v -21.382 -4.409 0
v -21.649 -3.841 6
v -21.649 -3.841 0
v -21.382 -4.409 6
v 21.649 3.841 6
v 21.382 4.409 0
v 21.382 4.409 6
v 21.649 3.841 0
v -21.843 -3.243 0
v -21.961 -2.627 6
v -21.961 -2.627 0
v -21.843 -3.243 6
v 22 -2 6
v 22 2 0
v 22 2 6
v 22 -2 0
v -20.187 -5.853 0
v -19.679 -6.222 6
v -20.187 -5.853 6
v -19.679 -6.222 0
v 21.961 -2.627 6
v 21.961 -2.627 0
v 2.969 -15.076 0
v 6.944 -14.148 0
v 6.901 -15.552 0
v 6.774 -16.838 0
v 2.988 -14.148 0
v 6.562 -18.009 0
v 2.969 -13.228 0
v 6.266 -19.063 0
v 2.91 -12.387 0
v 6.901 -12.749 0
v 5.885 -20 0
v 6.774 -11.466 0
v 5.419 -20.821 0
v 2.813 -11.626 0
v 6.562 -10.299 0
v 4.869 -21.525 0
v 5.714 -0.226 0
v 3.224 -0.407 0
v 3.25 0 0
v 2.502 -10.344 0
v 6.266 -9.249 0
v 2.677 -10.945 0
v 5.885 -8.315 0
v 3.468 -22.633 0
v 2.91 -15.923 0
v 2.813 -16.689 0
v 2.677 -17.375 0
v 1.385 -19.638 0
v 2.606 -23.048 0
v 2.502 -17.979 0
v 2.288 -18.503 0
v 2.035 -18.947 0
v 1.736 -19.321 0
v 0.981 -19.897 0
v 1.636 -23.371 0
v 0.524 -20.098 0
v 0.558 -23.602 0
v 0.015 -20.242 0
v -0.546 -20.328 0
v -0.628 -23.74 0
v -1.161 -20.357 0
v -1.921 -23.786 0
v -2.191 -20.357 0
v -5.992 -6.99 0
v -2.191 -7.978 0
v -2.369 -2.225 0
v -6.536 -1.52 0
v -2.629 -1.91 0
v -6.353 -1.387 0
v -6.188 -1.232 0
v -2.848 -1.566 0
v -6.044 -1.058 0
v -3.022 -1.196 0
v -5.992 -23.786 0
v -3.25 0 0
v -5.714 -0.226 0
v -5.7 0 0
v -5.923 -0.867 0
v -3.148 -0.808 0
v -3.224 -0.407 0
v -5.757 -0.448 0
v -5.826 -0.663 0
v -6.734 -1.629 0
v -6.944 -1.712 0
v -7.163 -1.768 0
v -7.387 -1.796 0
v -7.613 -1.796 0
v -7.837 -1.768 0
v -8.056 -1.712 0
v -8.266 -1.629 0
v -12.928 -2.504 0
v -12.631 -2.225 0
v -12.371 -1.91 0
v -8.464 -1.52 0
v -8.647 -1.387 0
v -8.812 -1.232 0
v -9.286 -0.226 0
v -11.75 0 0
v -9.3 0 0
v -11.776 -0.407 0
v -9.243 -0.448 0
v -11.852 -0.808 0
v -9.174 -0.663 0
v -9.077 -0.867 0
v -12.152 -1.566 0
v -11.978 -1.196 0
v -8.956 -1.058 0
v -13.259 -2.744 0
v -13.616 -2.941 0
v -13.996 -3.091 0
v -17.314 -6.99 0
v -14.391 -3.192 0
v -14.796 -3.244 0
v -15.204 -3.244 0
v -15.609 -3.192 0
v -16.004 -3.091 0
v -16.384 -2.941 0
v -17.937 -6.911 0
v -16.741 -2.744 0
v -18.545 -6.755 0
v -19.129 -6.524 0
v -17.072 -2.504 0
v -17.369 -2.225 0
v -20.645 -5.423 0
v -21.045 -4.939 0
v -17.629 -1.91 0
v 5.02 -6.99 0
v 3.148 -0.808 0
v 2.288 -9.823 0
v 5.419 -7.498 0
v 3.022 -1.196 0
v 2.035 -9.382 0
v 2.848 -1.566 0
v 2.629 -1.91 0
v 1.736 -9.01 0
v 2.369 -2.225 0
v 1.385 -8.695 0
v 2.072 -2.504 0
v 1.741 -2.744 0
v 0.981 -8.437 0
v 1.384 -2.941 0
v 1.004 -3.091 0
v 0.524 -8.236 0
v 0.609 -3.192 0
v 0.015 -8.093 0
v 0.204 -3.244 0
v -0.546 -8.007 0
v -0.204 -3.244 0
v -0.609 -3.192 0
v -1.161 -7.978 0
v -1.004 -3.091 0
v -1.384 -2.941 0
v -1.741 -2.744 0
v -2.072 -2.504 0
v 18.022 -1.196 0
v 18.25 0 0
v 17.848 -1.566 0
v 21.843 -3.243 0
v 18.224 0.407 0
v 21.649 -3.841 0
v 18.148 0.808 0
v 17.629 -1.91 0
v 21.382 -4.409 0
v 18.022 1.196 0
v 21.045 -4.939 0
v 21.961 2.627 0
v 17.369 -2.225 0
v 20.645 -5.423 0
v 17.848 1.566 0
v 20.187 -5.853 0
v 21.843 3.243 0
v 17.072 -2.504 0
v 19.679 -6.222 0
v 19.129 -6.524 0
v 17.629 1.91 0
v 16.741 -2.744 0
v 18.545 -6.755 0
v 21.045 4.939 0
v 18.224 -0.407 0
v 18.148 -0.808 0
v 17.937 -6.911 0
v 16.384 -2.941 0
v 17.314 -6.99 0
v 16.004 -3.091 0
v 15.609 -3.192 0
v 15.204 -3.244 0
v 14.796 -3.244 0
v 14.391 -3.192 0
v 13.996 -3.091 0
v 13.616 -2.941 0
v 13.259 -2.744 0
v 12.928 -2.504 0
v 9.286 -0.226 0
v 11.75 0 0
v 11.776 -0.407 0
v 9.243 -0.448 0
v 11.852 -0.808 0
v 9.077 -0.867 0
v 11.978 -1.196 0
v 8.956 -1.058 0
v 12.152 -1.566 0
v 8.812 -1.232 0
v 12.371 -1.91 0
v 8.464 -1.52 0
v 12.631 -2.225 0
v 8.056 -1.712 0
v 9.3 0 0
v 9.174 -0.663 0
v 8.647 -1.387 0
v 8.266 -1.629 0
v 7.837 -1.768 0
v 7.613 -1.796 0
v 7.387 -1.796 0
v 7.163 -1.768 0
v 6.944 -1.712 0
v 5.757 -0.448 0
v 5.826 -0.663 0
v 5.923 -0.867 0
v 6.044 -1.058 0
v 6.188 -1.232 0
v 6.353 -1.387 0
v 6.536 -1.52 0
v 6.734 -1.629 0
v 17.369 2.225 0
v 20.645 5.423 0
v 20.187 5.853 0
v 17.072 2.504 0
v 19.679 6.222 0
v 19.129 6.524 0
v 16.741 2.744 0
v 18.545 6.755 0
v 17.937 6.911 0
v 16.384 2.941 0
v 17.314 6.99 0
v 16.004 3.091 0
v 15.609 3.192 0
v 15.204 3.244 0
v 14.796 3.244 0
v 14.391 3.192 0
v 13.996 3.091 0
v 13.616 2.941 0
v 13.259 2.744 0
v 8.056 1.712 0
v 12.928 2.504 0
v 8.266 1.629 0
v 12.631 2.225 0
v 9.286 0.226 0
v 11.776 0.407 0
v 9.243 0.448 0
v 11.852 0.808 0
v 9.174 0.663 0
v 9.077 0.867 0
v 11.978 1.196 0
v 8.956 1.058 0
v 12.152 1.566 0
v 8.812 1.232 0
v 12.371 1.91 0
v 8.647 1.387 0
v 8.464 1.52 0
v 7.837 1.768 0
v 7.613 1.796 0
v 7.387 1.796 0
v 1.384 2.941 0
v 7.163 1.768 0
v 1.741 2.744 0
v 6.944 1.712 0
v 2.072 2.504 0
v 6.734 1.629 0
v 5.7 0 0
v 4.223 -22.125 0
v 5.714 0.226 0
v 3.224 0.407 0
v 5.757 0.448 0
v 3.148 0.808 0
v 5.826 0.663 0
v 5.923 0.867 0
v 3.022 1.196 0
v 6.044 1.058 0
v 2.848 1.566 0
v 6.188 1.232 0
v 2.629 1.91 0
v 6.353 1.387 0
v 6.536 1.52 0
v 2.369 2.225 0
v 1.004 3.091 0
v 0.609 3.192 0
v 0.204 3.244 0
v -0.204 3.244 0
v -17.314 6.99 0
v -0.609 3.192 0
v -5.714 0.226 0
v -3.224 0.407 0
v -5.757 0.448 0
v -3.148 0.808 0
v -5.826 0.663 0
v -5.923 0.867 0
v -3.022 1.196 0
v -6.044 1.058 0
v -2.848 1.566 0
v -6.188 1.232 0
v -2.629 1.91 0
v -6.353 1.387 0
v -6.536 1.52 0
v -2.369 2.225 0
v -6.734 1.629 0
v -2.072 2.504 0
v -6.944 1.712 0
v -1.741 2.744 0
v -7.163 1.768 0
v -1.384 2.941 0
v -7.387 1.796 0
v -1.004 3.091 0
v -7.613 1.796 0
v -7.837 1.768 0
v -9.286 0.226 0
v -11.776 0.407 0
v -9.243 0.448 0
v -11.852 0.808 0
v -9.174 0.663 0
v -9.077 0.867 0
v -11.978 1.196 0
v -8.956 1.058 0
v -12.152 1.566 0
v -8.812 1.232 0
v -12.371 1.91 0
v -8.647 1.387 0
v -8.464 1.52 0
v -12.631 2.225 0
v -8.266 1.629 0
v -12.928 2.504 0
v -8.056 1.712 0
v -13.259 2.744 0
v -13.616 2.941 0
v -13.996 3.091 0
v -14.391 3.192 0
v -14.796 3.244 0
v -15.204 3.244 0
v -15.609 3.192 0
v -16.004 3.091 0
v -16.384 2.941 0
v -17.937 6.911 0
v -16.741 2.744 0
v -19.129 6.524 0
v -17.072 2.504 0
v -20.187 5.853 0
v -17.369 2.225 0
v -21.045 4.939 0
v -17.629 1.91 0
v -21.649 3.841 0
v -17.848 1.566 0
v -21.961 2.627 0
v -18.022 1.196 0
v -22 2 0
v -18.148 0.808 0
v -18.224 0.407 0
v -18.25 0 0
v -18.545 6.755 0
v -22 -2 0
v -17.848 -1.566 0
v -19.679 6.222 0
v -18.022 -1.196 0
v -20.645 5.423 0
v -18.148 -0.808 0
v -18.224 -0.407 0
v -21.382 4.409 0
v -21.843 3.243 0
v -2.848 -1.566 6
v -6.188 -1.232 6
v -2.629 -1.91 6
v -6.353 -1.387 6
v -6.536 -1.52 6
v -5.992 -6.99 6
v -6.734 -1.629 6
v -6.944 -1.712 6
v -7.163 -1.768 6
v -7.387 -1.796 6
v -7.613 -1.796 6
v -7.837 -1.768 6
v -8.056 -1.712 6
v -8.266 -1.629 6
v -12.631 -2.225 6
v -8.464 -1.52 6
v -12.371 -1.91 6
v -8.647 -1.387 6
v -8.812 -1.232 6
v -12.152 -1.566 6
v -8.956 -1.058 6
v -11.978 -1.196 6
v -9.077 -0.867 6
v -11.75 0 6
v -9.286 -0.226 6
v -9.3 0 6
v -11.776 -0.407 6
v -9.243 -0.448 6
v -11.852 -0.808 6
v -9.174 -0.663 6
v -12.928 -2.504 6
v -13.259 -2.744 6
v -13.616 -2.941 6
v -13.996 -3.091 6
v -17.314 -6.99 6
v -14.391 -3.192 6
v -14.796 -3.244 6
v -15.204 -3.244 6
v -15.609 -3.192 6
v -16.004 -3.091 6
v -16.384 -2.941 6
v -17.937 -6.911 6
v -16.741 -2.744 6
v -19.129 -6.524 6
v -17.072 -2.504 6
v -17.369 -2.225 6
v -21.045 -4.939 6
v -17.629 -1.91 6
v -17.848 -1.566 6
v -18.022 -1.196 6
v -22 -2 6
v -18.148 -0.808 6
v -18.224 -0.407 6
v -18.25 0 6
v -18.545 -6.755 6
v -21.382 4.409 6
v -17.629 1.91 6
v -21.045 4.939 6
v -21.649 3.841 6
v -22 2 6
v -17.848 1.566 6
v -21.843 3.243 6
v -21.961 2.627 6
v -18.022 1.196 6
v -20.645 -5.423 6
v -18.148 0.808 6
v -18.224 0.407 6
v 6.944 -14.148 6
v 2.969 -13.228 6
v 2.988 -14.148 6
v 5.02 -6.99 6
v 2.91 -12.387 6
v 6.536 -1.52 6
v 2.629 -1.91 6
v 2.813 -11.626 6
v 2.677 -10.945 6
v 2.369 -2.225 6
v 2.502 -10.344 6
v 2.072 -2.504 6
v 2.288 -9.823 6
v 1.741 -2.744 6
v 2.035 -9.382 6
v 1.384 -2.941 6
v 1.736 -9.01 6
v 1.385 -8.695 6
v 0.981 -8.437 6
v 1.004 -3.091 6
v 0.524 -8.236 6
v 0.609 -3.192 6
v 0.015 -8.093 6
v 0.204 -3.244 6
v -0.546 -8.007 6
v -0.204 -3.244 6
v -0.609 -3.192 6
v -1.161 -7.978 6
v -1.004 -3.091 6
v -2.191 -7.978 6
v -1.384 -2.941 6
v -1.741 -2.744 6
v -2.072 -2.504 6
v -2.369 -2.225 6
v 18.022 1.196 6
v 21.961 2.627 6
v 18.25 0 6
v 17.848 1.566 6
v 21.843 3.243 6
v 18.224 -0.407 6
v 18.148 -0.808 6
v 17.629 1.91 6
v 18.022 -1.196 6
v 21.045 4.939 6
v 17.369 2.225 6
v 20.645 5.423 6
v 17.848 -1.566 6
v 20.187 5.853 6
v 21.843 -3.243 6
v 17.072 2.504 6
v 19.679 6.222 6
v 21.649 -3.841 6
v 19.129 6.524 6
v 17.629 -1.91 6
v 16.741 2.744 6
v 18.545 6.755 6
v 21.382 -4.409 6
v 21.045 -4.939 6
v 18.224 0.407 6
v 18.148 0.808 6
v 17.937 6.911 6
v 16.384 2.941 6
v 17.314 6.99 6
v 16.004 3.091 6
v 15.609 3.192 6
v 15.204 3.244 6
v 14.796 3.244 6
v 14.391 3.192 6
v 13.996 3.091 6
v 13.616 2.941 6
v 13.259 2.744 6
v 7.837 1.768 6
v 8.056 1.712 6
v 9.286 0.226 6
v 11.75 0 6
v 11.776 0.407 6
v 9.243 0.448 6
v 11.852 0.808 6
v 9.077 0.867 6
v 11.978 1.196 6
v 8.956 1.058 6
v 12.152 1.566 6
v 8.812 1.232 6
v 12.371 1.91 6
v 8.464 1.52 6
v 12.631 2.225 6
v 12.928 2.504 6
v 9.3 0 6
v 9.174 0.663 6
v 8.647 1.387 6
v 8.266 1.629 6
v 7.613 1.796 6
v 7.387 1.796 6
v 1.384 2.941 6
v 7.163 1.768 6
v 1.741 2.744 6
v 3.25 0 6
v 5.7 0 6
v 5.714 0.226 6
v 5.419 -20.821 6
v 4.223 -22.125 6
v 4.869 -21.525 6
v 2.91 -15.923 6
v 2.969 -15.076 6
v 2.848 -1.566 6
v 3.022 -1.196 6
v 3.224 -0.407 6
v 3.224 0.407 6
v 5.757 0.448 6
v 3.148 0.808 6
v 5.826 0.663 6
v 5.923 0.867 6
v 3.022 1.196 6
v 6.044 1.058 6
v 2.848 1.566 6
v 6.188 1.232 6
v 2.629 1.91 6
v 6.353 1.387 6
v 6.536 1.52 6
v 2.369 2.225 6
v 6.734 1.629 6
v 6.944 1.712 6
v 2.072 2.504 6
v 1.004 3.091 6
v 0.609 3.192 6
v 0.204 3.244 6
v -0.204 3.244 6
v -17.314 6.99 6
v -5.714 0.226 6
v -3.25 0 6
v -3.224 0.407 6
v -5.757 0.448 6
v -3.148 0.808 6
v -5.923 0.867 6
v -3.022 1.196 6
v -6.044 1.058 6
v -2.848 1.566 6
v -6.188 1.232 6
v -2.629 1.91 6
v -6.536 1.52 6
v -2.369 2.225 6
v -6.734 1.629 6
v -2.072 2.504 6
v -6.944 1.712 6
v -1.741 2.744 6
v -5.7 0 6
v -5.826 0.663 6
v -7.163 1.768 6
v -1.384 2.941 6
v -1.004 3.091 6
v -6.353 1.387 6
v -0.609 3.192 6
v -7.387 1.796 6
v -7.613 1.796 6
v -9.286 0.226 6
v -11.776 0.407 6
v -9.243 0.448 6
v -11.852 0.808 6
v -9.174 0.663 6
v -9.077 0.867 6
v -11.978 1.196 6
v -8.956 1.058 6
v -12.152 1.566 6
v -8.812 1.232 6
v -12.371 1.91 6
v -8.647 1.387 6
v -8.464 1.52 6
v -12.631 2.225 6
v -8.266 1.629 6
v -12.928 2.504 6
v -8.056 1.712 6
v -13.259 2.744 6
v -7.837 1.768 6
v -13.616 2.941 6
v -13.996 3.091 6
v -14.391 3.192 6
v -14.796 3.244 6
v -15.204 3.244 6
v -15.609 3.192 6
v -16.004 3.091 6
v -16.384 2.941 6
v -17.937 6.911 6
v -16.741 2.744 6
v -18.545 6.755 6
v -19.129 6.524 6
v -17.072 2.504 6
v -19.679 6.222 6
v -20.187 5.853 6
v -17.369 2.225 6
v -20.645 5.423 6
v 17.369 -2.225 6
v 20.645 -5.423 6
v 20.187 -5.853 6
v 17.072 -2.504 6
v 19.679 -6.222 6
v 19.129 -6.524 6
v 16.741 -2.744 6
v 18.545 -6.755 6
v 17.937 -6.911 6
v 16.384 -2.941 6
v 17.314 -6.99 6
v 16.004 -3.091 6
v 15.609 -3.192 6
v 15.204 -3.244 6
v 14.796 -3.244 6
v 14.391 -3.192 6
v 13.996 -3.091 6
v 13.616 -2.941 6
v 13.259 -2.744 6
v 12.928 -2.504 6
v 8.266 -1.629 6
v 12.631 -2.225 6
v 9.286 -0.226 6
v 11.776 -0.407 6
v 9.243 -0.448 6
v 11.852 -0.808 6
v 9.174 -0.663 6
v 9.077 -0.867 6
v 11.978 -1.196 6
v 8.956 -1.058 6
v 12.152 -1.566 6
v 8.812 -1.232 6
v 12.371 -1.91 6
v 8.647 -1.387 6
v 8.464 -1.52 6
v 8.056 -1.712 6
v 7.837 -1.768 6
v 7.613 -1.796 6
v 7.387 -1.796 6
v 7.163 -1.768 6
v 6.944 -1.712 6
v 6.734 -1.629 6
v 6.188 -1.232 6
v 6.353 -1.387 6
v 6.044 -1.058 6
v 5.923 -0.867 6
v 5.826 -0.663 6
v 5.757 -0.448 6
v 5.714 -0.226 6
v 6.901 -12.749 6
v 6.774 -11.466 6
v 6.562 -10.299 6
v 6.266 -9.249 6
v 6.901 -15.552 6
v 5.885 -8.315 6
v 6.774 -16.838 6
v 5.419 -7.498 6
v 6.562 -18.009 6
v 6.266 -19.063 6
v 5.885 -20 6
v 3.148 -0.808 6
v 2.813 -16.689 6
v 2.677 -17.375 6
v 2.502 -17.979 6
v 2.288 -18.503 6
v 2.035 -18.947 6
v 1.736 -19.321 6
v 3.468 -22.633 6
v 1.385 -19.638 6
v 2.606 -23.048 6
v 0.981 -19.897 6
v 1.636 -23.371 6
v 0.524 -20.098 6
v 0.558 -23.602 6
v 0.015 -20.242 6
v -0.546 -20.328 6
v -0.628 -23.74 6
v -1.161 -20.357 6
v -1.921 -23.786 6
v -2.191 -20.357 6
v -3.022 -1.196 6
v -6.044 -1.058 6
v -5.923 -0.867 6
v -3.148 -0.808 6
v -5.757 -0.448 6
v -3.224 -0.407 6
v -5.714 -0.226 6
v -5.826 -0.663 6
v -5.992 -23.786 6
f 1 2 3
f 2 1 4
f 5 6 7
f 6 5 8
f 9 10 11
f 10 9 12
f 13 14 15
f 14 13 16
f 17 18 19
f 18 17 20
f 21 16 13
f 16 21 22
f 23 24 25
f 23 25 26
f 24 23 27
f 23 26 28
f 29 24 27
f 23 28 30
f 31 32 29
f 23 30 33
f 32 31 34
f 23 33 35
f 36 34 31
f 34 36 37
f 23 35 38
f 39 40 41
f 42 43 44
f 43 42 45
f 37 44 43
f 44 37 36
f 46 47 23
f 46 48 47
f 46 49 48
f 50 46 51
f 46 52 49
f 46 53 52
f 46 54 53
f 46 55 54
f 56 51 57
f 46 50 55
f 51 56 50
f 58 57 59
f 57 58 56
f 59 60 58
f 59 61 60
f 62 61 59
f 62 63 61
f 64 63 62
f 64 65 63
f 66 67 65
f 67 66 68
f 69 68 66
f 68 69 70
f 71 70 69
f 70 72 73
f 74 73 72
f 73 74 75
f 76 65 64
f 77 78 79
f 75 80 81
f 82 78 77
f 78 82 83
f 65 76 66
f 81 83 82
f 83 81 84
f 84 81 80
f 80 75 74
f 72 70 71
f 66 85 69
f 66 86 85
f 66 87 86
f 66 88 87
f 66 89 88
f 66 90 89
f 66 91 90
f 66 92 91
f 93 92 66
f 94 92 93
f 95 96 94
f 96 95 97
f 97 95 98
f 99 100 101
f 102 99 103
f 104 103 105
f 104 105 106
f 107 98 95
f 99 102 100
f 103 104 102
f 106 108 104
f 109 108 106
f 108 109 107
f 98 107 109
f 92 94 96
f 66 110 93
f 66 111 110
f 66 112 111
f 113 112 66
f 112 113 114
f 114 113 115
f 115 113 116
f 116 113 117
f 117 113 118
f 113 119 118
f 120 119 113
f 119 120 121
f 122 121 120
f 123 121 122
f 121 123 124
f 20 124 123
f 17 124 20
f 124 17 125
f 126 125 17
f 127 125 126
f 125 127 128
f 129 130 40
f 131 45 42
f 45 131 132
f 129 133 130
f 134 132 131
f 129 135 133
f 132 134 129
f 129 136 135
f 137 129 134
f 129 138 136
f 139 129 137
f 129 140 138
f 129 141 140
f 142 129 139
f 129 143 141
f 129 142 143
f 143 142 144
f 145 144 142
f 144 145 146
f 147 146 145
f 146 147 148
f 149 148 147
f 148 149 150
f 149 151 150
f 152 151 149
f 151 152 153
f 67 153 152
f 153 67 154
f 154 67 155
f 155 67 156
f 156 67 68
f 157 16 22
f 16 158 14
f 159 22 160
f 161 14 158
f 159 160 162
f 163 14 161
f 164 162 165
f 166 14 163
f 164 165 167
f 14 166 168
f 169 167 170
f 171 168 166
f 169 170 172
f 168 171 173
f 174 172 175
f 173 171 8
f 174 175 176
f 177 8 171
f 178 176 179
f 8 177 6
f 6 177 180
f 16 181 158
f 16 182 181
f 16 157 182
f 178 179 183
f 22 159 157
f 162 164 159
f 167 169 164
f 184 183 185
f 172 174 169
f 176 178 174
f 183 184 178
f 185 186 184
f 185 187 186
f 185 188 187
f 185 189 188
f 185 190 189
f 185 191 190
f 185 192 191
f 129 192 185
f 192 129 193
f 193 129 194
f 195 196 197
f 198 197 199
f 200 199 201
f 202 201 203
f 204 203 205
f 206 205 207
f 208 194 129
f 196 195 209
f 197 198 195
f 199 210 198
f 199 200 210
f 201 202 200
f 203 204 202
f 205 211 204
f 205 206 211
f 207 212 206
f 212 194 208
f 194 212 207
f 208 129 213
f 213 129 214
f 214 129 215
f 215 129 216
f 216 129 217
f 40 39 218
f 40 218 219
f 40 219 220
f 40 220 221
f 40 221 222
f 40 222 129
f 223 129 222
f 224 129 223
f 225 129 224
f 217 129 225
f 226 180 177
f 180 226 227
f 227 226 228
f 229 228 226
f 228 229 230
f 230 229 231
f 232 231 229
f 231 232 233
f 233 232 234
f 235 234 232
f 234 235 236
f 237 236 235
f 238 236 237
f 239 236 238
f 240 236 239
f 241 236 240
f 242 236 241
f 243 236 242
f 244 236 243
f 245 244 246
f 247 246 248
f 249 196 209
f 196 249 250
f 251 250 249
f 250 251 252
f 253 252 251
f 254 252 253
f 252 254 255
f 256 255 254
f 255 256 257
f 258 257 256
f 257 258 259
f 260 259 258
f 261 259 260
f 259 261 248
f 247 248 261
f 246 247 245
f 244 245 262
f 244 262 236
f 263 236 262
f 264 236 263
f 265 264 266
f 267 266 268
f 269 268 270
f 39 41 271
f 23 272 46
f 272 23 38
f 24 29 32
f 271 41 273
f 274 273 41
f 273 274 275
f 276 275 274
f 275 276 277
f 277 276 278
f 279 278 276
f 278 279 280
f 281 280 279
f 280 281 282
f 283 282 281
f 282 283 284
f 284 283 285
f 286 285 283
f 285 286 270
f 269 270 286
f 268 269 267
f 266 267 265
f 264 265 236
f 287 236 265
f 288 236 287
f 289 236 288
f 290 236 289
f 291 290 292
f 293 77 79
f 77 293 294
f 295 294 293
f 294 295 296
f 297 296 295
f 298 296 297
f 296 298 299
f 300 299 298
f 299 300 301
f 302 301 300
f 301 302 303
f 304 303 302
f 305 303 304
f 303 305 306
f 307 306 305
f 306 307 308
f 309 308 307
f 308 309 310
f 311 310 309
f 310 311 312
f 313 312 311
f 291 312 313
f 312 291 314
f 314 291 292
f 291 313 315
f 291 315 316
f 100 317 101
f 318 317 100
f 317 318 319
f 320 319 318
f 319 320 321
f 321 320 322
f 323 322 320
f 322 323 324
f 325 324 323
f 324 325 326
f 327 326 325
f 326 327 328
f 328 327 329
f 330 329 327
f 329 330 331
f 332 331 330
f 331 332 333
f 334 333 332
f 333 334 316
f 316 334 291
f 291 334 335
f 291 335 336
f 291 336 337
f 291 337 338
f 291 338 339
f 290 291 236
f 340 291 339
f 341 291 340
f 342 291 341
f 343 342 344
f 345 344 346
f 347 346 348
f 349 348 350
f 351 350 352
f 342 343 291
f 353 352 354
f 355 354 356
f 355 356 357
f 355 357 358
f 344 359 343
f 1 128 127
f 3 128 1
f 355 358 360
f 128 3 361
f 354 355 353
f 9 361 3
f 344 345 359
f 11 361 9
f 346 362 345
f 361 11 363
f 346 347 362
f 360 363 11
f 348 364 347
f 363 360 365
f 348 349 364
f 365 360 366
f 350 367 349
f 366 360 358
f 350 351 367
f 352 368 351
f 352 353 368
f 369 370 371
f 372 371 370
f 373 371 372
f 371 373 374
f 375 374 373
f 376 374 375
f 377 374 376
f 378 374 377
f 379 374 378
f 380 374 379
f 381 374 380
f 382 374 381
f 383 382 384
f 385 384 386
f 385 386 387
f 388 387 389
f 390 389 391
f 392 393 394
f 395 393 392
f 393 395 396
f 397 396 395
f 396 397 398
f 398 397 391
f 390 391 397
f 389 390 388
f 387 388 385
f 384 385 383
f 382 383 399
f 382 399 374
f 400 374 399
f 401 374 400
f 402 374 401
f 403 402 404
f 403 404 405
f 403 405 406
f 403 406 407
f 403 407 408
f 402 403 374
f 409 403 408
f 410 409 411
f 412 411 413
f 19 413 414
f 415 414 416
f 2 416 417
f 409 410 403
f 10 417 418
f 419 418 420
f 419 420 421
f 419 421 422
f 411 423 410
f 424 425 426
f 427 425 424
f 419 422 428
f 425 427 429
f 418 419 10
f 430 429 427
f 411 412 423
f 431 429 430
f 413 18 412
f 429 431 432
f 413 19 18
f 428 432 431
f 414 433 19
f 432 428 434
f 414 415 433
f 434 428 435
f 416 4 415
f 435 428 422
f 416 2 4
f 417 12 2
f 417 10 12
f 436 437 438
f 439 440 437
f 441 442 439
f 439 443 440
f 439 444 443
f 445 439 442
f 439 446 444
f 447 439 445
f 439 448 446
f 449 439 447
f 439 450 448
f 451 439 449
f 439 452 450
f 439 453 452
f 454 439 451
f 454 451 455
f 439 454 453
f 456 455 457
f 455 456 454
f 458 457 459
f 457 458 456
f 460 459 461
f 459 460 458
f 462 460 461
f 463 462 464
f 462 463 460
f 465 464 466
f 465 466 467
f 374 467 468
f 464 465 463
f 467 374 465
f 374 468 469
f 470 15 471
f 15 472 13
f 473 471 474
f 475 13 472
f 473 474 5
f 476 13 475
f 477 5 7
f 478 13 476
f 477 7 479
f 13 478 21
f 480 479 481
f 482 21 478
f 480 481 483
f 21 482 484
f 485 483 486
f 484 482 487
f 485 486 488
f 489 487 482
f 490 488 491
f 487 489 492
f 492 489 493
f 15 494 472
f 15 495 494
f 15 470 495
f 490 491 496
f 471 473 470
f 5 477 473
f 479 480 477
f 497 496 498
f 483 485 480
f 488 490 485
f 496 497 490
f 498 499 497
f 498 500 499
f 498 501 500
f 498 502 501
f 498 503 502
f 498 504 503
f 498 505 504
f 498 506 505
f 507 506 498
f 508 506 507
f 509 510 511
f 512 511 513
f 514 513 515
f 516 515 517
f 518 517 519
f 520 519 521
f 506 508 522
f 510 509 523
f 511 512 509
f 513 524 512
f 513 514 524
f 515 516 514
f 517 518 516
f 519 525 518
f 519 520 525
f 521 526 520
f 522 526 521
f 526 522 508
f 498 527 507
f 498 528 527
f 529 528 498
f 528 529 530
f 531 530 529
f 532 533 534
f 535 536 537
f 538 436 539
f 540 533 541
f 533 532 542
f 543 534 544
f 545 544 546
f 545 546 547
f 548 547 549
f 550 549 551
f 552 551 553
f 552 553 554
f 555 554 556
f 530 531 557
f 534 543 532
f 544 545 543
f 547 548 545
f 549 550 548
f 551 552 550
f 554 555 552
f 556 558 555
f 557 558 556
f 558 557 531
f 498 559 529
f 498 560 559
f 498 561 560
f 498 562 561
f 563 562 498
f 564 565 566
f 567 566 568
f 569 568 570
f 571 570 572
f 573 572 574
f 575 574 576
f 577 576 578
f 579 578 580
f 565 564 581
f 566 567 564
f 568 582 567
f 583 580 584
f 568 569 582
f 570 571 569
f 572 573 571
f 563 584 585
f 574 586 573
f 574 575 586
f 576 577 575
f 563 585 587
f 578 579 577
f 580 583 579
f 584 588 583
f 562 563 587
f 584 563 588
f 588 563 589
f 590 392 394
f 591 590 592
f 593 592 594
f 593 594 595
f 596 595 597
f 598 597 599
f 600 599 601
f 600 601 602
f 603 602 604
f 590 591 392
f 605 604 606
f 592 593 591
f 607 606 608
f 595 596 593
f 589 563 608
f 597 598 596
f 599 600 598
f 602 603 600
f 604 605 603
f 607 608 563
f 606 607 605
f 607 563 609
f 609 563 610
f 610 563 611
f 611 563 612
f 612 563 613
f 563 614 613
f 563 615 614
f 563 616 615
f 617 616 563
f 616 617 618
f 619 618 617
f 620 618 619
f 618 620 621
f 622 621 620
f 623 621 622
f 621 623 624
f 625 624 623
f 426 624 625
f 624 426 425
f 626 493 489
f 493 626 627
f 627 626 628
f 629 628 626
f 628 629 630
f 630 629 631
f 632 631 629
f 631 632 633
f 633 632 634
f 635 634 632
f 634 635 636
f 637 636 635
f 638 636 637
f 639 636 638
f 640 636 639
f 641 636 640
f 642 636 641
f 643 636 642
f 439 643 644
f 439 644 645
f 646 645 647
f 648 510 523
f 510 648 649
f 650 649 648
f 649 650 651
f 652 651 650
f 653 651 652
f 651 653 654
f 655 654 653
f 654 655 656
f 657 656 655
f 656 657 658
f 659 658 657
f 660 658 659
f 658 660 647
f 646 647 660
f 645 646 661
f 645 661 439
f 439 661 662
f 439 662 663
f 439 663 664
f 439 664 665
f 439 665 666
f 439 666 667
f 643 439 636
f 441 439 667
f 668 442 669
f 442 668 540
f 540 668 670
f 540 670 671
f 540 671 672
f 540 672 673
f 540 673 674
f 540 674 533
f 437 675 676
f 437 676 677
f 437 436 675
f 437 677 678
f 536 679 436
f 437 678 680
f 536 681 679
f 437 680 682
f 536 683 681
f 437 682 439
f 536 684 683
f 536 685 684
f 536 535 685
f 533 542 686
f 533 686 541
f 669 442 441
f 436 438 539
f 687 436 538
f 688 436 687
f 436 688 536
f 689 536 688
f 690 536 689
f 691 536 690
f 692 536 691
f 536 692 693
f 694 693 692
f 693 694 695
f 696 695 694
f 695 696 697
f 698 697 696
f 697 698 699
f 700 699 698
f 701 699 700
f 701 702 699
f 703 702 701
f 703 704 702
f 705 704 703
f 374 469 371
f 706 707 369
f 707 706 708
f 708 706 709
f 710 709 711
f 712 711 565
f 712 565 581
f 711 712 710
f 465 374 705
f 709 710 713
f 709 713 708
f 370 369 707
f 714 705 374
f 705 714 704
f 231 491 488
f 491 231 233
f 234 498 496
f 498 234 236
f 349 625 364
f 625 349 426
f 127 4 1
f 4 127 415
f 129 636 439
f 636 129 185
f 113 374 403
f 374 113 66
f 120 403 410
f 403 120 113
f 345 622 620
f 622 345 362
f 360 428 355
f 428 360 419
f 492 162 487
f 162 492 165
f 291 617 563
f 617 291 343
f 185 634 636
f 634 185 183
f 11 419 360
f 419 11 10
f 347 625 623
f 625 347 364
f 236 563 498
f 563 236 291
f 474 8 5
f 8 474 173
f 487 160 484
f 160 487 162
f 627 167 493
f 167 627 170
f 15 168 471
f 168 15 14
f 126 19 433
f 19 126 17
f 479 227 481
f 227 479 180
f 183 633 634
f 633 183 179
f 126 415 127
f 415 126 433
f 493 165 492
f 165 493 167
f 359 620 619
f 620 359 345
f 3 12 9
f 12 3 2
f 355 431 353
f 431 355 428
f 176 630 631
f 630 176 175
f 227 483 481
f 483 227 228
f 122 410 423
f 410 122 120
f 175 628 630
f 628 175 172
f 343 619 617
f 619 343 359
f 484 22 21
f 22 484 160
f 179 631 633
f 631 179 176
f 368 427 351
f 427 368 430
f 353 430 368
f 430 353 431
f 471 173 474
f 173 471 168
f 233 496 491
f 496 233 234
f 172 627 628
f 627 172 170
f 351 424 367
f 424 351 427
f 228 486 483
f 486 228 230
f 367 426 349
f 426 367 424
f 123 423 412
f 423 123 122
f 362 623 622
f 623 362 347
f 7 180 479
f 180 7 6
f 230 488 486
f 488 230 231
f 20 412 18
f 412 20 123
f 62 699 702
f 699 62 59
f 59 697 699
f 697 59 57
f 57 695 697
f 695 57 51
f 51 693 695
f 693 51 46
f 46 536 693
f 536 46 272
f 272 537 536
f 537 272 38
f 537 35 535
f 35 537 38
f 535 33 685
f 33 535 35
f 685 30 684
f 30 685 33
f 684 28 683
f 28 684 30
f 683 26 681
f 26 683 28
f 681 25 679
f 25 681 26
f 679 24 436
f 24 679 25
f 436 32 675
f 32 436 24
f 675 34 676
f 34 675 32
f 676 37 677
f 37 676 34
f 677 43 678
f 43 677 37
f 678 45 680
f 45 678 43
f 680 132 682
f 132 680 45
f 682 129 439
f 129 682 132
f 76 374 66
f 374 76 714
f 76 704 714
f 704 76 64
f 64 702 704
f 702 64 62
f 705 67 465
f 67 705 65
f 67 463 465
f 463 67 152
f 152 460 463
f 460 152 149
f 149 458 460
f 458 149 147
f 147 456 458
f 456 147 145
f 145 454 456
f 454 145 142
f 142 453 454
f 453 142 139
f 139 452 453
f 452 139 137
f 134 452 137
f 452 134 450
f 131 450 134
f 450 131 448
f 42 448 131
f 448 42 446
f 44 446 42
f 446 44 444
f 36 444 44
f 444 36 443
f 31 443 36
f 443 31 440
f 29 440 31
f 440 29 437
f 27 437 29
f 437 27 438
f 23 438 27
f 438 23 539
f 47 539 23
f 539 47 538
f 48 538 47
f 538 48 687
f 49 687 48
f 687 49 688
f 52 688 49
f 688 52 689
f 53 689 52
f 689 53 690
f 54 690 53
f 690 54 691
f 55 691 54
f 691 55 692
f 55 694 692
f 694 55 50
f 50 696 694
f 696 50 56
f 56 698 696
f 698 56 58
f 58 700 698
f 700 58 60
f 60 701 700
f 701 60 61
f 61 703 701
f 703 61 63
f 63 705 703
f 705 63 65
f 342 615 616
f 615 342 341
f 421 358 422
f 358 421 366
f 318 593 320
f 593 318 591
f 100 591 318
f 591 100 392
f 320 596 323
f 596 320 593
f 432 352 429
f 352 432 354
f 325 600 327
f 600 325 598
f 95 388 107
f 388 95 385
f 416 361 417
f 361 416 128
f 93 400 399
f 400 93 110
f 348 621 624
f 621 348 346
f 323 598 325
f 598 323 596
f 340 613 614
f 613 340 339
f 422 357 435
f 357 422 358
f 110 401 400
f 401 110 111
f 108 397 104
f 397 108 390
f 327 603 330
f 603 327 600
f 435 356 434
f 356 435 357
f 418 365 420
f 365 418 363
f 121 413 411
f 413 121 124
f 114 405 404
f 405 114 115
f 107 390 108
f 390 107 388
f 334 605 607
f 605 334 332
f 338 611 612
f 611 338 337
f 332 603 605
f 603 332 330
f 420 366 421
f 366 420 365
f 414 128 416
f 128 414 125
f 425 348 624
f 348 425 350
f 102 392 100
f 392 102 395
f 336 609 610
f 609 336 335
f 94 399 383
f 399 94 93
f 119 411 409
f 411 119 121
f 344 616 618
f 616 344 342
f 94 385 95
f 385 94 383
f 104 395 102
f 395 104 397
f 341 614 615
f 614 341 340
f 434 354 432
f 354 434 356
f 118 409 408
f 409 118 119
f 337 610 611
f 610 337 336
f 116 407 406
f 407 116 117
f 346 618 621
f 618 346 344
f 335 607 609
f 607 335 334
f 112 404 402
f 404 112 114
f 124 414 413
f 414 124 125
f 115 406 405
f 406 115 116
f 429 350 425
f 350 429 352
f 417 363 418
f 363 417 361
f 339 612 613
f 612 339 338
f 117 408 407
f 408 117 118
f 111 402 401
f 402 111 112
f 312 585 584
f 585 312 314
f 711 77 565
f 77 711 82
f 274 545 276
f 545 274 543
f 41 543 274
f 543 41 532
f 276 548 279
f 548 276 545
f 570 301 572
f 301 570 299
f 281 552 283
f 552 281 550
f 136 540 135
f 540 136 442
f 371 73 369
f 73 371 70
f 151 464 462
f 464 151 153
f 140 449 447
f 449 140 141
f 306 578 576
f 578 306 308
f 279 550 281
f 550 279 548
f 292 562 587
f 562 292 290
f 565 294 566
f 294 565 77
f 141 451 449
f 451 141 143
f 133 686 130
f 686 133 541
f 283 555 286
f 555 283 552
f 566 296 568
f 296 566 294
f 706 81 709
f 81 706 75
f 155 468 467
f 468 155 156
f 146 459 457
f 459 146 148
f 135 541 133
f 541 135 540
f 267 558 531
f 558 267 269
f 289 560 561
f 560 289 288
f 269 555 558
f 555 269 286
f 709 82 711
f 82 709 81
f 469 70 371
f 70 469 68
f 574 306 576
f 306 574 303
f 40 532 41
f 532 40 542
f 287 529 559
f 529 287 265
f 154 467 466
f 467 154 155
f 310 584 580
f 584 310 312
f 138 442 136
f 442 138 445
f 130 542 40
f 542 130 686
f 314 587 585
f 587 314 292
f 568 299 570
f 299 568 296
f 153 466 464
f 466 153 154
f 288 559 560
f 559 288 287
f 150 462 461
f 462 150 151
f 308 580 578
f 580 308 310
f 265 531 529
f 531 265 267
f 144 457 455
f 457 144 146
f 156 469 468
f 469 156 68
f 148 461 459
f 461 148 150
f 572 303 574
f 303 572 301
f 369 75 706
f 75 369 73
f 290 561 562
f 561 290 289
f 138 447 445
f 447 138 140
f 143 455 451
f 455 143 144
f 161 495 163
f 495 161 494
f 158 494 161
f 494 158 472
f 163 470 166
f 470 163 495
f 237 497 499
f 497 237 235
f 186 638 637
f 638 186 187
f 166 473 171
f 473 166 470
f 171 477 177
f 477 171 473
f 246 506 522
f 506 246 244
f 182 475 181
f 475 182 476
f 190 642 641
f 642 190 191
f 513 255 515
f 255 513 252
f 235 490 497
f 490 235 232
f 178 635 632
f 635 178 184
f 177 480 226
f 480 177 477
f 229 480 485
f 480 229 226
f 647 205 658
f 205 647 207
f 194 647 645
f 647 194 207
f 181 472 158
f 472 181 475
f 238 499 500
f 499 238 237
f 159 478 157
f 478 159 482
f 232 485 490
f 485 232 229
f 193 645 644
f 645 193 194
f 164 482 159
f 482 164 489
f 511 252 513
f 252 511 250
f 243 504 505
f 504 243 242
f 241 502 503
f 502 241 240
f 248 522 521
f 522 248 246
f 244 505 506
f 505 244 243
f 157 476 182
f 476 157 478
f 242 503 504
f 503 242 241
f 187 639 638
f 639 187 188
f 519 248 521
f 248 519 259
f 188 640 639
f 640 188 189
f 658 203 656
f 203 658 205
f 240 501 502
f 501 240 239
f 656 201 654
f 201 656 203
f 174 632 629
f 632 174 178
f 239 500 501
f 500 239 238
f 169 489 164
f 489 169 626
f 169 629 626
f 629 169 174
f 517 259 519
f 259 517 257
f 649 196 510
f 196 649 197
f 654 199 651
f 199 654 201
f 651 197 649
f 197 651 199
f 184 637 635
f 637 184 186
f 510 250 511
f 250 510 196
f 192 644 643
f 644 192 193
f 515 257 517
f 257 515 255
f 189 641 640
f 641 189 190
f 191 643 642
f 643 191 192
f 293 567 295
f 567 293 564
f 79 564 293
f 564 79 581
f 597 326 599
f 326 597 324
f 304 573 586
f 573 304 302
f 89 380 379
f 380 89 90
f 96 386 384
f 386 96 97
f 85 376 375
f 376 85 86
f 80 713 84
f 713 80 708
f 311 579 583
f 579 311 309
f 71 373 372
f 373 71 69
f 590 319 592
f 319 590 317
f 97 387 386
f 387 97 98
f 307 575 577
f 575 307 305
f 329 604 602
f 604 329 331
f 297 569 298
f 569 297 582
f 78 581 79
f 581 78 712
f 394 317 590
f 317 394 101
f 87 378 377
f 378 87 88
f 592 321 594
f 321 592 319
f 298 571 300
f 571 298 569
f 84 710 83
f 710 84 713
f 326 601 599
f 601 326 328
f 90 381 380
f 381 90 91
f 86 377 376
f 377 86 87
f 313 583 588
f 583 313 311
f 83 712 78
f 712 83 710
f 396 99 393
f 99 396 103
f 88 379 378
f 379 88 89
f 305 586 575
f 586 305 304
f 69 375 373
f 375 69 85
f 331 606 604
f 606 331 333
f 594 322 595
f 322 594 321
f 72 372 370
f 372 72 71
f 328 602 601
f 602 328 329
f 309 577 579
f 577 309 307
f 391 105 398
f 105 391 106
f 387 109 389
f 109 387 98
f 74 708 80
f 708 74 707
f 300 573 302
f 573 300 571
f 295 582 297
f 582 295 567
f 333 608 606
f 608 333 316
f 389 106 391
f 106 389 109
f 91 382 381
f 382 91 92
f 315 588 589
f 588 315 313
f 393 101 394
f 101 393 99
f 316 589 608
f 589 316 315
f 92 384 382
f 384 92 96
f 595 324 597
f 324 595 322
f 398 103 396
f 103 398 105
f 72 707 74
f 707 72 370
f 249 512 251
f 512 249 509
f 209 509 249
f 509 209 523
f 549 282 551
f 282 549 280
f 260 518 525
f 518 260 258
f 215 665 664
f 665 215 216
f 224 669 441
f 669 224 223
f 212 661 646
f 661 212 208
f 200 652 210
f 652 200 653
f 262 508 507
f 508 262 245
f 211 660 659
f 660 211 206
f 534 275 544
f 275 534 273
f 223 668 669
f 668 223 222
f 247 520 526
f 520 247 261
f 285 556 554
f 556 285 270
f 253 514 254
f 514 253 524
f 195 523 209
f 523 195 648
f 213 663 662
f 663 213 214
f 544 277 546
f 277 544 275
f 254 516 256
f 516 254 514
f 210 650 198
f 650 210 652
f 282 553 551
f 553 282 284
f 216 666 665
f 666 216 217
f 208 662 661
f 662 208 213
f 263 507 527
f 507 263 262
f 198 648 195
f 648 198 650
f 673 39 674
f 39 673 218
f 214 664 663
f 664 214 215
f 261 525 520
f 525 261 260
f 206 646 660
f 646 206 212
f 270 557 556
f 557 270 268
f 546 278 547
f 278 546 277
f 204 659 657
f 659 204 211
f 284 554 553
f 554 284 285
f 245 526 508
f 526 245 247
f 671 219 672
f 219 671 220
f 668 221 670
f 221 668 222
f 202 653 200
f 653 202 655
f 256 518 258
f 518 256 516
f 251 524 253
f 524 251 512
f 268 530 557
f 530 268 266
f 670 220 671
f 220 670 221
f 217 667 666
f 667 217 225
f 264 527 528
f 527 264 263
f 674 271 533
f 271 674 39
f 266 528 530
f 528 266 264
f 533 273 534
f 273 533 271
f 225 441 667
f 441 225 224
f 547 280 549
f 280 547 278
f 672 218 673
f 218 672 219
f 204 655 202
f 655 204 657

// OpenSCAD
$fn = 50;


difference() {
	union() {
		hull() {
			translate(v = [-17.0000000000, 2.0000000000, 0]) {
				cylinder(h = 6, r = 5);
			}
			translate(v = [17.0000000000, 2.0000000000, 0]) {
				cylinder(h = 6, r = 5);
			}
			translate(v = [-17.0000000000, -2.0000000000, 0]) {
				cylinder(h = 6, r = 5);
			}
			translate(v = [17.0000000000, -2.0000000000, 0]) {
				cylinder(h = 6, r = 5);
			}
		}
		translate(v = [0, -5, 0]) {
			linear_extrude(height = 6) {
				text(font = "DejaVu Sans Mono:style=Bold", halign = "center", size = 19.0000000000, text = "D", valign = "top");
			}
		}
	}
	union() {
		translate(v = [-15.0000000000, 0.0000000000, 0]) {
			translate(v = [0, 0, -100]) {
				cylinder(h = 200, r = 3.2500000000);
			}
		}
		translate(v = [0, 0, -100]) {
			cylinder(h = 200, r = 3.2500000000);
		}
		translate(v = [15.0000000000, 0.0000000000, 0]) {
			translate(v = [0, 0, -100]) {
				cylinder(h = 200, r = 3.2500000000);
			}
		}
		translate(v = [-15.0000000000, 0.0000000000, 0]) {
			translate(v = [0, 0, -100]) {
				cylinder(h = 200, r = 1.8000000000);
			}
		}
		translate(v = [-7.5000000000, 0.0000000000, 0]) {
			translate(v = [0, 0, -100]) {
				cylinder(h = 200, r = 1.8000000000);
			}
		}
		translate(v = [0, 0, -100]) {
			cylinder(h = 200, r = 1.8000000000);
		}
		translate(v = [7.5000000000, 0.0000000000, 0]) {
			translate(v = [0, 0, -100]) {
				cylinder(h = 200, r = 1.8000000000);
			}
		}
		translate(v = [15.0000000000, 0.0000000000, 0]) {
			translate(v = [0, 0, -100]) {
				cylinder(h = 200, r = 1.8000000000);
			}
		}
	}
}
